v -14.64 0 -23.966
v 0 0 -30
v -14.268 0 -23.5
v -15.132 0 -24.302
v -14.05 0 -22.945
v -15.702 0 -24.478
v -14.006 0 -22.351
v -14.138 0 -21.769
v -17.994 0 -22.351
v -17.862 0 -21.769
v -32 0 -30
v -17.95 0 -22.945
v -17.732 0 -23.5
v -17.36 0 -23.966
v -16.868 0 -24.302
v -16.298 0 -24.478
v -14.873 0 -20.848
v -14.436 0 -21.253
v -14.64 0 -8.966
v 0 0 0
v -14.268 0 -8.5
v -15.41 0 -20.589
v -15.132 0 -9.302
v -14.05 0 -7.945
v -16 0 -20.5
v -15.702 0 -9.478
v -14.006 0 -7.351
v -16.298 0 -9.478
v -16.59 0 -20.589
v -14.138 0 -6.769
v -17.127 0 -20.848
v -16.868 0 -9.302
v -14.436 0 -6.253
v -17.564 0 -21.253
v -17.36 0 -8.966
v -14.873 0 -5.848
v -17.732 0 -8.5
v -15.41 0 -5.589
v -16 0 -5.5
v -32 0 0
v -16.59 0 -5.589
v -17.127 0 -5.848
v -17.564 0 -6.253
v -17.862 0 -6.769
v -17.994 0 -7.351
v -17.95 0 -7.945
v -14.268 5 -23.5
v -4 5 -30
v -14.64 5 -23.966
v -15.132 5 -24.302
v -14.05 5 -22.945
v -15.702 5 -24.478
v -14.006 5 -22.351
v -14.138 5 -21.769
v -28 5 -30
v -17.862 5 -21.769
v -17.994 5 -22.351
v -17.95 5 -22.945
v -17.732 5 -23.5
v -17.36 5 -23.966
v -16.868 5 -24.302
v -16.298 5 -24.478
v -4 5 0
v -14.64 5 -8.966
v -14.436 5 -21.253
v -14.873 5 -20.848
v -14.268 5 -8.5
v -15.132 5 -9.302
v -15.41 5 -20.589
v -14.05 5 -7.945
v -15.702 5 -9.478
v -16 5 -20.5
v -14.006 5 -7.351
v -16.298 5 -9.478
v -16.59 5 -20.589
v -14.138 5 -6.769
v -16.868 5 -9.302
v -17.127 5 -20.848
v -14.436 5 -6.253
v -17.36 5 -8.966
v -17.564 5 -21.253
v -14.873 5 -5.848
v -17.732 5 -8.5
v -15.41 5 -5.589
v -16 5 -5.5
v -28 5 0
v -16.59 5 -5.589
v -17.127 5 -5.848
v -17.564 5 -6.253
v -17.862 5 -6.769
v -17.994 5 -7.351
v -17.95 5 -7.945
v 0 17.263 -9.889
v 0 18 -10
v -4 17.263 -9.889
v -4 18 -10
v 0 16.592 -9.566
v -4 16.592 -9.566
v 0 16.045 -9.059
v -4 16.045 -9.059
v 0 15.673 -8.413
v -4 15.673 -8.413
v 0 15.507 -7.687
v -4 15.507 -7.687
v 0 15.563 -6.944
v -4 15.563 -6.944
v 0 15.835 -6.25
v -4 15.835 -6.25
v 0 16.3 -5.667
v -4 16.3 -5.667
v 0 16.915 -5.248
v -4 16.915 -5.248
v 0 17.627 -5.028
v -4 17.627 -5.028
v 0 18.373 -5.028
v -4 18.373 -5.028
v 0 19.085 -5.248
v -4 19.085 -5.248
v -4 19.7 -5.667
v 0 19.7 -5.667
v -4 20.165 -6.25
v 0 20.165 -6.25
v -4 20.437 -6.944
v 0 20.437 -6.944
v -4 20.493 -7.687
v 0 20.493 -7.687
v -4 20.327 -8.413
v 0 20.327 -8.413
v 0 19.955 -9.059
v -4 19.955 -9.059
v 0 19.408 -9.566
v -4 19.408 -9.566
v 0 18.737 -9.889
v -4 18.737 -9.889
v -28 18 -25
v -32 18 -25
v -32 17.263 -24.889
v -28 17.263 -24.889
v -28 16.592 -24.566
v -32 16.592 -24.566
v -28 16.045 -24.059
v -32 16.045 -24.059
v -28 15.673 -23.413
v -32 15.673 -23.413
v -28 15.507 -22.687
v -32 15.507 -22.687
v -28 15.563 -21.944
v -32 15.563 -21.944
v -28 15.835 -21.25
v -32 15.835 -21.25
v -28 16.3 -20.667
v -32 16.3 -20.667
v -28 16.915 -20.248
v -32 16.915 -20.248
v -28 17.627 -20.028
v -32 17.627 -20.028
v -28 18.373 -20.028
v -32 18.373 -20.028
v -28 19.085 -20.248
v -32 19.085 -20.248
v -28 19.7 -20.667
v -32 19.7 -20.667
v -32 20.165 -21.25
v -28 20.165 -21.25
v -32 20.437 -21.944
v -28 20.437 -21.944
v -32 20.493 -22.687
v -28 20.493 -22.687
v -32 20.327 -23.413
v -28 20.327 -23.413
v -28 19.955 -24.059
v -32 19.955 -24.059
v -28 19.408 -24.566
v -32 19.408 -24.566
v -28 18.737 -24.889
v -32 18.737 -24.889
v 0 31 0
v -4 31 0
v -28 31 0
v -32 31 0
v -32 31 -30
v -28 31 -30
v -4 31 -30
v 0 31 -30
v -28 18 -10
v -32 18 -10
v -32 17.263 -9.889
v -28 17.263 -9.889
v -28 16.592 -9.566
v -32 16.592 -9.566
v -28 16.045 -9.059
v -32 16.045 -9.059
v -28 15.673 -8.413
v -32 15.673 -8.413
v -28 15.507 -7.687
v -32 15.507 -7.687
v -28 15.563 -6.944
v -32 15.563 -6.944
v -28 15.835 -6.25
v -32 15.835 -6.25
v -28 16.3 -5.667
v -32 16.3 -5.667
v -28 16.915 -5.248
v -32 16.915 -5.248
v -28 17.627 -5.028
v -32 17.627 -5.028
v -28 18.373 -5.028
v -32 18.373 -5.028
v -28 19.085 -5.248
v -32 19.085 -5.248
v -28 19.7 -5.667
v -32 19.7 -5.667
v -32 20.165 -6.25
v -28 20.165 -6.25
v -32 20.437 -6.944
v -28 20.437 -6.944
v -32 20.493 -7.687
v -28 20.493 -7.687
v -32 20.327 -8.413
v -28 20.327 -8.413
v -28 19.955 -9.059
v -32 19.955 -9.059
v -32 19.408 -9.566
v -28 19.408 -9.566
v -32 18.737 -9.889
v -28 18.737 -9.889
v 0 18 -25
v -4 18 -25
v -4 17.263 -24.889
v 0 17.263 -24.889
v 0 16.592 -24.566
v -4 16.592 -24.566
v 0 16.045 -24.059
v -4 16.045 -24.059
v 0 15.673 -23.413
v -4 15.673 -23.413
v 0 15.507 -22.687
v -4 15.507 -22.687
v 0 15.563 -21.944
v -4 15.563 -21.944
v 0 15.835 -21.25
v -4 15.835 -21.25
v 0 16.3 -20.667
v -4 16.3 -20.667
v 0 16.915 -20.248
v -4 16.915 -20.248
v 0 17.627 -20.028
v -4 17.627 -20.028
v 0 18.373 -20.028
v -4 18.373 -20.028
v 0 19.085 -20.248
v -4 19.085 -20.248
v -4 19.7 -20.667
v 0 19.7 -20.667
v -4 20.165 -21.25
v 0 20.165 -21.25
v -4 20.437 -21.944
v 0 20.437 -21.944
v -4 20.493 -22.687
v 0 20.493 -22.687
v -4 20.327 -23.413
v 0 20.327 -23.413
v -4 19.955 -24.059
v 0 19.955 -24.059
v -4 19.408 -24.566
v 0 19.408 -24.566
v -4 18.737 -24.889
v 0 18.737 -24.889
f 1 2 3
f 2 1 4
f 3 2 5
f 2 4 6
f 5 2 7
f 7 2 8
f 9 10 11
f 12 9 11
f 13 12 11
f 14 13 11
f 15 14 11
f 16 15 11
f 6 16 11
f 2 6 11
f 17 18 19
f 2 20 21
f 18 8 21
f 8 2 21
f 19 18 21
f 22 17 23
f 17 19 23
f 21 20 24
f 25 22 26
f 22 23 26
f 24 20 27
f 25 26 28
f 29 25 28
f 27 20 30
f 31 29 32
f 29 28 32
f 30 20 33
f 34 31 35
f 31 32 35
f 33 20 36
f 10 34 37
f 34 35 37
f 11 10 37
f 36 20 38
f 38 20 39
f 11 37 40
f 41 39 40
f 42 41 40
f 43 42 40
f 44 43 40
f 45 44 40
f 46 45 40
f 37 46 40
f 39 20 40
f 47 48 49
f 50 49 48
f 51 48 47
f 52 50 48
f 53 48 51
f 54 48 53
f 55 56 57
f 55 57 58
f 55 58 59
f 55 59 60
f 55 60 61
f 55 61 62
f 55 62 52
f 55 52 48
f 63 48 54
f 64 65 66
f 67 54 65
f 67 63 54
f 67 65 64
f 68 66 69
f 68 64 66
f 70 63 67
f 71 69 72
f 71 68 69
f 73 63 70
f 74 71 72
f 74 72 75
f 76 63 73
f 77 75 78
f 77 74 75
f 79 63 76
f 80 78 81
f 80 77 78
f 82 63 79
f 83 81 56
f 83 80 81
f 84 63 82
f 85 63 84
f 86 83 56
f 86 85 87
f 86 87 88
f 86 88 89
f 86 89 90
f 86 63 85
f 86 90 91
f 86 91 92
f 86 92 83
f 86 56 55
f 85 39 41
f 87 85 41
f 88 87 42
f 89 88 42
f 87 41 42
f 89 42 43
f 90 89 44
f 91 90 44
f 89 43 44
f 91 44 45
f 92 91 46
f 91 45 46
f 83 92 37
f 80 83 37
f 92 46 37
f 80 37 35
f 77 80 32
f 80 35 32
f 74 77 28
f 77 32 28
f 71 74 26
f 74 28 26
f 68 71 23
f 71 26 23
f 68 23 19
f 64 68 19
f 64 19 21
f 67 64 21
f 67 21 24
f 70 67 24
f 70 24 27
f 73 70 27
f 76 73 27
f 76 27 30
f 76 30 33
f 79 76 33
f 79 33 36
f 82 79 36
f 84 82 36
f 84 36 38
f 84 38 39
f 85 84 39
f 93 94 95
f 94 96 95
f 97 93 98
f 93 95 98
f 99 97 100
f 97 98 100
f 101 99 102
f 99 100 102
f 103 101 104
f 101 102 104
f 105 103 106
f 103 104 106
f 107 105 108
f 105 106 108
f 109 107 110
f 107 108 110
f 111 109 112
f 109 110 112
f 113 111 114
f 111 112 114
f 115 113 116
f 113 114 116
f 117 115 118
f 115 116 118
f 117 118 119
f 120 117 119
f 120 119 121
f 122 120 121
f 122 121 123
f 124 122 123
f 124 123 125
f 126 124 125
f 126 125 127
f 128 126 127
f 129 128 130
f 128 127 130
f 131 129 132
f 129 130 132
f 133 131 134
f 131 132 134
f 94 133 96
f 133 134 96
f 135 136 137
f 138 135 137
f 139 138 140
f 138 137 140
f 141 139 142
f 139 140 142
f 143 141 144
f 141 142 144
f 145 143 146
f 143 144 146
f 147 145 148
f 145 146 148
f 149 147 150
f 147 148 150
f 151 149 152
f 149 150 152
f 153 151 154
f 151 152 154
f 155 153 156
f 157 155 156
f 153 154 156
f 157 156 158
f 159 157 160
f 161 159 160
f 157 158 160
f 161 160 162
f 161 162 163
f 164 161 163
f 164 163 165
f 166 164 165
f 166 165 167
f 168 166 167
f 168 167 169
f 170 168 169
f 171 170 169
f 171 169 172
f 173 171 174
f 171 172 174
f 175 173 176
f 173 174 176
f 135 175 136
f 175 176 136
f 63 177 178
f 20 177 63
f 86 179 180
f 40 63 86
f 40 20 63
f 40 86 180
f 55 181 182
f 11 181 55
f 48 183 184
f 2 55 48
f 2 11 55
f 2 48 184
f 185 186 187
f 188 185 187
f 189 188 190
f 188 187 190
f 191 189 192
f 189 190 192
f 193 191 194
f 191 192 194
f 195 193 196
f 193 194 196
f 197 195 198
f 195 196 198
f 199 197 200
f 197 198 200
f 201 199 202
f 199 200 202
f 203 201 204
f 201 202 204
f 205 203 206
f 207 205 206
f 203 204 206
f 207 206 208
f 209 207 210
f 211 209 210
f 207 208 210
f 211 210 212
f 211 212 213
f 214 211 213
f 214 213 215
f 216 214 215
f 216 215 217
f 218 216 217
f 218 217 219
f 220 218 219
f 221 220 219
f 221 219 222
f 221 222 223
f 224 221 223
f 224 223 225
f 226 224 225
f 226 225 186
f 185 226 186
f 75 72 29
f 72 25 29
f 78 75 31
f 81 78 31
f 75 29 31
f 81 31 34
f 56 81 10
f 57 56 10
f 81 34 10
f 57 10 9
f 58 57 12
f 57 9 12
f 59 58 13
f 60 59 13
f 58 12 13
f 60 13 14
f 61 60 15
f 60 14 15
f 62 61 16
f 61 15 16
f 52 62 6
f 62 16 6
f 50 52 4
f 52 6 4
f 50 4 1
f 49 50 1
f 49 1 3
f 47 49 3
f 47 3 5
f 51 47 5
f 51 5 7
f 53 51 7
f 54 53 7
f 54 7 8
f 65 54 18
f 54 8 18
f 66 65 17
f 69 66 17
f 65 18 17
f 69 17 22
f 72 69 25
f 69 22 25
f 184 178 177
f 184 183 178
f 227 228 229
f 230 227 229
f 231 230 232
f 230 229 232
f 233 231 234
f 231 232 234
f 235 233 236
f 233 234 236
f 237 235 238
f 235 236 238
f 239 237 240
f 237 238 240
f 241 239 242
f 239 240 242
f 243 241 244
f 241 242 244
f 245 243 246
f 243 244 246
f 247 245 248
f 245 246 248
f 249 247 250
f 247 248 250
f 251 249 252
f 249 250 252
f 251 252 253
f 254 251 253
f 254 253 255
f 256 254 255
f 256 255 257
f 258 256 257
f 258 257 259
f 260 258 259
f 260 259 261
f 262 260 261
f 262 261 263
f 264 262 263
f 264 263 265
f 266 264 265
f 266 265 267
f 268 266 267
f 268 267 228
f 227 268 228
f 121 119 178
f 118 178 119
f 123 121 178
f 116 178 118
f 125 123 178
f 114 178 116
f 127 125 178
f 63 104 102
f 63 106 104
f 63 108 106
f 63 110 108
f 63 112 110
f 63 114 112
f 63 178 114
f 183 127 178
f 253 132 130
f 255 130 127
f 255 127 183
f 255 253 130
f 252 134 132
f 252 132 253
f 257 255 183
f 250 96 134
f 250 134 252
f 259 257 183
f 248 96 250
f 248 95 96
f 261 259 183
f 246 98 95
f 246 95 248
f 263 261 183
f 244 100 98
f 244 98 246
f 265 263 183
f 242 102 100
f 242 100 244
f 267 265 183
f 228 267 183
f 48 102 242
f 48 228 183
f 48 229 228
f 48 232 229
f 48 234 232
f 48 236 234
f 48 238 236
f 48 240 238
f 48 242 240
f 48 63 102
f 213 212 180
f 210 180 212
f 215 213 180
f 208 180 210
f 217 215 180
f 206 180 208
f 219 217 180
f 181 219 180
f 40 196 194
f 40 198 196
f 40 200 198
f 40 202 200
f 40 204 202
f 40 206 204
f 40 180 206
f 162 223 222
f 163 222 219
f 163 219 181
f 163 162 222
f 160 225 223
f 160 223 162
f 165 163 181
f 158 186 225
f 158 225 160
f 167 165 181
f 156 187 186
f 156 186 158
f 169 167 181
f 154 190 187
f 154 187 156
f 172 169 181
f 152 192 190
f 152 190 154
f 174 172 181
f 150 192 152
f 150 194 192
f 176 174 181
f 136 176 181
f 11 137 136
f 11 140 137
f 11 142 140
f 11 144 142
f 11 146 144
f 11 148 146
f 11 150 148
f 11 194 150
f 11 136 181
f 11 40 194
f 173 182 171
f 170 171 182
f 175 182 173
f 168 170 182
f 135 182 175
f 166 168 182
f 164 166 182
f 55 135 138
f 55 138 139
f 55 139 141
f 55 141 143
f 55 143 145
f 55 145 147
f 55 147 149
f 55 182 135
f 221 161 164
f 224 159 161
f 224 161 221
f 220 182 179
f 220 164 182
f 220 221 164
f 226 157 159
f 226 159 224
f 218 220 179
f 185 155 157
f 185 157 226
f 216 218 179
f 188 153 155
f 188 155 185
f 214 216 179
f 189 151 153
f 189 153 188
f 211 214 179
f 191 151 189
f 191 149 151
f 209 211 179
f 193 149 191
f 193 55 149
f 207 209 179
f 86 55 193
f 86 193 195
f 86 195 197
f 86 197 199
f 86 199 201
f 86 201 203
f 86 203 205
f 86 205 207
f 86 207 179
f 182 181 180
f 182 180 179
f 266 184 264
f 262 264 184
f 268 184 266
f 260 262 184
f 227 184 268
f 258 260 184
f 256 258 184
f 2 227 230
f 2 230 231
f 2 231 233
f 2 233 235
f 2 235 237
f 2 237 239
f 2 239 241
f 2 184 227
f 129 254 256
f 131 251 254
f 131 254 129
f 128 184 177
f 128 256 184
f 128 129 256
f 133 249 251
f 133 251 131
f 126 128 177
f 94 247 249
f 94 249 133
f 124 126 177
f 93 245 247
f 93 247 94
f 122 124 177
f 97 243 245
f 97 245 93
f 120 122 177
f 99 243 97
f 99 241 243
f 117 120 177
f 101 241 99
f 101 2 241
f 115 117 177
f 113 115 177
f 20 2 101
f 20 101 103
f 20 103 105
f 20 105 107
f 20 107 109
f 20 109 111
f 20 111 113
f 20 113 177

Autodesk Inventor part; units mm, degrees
ref_plane "YZ Plane" through (0, 0, 0) normal (1, 0, 0) x (0, 1, 0)
ref_plane "XZ Plane" through (0, 0, 0) normal (0, 1, 0) x (-1, 0, 0)
ref_plane "XY Plane" through (0, 0, 0) normal (0, 0, 1) x (1, 0, 0)
sketch "Esboço1" plane through (0, 0, 0) normal (0, 1, 0) x (-1, 0, 0)
  line L0 (0, 0) -> (32, 0)
  line L1 (32, 0) -> (32, -30)
  line L2 (32, -30) -> (0, -30)
  line L3 (0, -30) -> (0, 0)
  dimension "d0" = 32
  dimension "d1" = 30
extrude "Extrusion1" add sketch "Esboço1" along normal blind 5
sketch "Sketch4" plane through (0, 5, 0) normal (0, 1, 0) x (1, 0, 0)
  line L0 (-32, 30) -> (-28, 30)
  line L1 (-28, 30) -> (-28, 0)
  line L2 (-28, 0) -> (-32, 0)
  line L3 (-32, 0) -> (-32, 30)
  line L4 (-4, 30) -> (0, 30)
  line L5 (0, 30) -> (0, 0)
  line L6 (0, 0) -> (-4, 0)
  line L7 (-4, 0) -> (-4, 30)
  dimension "d59" = 24
extrude "Extrusion2" add sketch "Sketch4" along normal blind 26
sketch "Sketch5" plane through (0, 0, 0) normal (1, 0, 0) x (0, 0, -1)
  line L0 (0, 0) -> (0, 31) projected
  line L1 (30, 0) -> (30, 31) projected
  line L2 (0, 31) -> (30, 31) projected
  point P0 (7.5, 18)
  point P1 (22.5, 18)
  dimension "d30" = 7.5
  dimension "d31" = 7.5
  dimension "d32" = 13
  dimension "d33" = 13
hole "Hole2" at (0, 18, -7.5) at (0, 18, -22.5) direction (-1, 0, 0) diameter 5 end through all
sketch "Esboço6" plane through (0, 5, 0) normal (0, 1, 0) x (1, 0, 0)
  line L0 (-4, 30) -> (-28, 30) projected
  line L1 (-28, 0) -> (-28, 30) projected
  line L2 (-32, 30) -> (-32, 0) projected
  line L3 (-4, 30) -> (-4, 0) projected
  point P0 (0, 0)
  point P1 (-16, 22.5)
  point P2 (-16, 7.5)
  dimension "d43" = 15
  dimension "d45" = 24
  dimension "d48" = 30
  dimension "d57" = 12
  dimension "d58" = 7.5
hole "Furo3" at (-16, 5, -22.5) at (-16, 5, -7.5) direction (0, -1, 0) diameter 4 depth 5
equation "\"d31\" = d30"
equation "\"d33\" = d32"
equation "\"d39\" = Espessura"
equation "\"d57\" = 0.5 * d45"
equation "\"d58\" = -0.5 * d43 + 0.5 * d48"
equation "\"d55\" = Espessura"
equation "\"Raio_vergadura\" = Espessura"
equation "\"Largura_alívio_de_vergadura\" = Espessura"
equation "\"Profundidade_alívio_de_vergadura\" = 0.5 * Espessura"
equation "\"Raiodetransição\" = Raio_vergadura"
equation "\"Tamanho_de_raio_de_Jacobi\" = Raio_vergadura"
equation "\"TamanhoFolga\" = Espessura"
equation "\"Espessura\" = 5"
properties part number "Suporte da célula de carga" material "Aço galvanizado"
